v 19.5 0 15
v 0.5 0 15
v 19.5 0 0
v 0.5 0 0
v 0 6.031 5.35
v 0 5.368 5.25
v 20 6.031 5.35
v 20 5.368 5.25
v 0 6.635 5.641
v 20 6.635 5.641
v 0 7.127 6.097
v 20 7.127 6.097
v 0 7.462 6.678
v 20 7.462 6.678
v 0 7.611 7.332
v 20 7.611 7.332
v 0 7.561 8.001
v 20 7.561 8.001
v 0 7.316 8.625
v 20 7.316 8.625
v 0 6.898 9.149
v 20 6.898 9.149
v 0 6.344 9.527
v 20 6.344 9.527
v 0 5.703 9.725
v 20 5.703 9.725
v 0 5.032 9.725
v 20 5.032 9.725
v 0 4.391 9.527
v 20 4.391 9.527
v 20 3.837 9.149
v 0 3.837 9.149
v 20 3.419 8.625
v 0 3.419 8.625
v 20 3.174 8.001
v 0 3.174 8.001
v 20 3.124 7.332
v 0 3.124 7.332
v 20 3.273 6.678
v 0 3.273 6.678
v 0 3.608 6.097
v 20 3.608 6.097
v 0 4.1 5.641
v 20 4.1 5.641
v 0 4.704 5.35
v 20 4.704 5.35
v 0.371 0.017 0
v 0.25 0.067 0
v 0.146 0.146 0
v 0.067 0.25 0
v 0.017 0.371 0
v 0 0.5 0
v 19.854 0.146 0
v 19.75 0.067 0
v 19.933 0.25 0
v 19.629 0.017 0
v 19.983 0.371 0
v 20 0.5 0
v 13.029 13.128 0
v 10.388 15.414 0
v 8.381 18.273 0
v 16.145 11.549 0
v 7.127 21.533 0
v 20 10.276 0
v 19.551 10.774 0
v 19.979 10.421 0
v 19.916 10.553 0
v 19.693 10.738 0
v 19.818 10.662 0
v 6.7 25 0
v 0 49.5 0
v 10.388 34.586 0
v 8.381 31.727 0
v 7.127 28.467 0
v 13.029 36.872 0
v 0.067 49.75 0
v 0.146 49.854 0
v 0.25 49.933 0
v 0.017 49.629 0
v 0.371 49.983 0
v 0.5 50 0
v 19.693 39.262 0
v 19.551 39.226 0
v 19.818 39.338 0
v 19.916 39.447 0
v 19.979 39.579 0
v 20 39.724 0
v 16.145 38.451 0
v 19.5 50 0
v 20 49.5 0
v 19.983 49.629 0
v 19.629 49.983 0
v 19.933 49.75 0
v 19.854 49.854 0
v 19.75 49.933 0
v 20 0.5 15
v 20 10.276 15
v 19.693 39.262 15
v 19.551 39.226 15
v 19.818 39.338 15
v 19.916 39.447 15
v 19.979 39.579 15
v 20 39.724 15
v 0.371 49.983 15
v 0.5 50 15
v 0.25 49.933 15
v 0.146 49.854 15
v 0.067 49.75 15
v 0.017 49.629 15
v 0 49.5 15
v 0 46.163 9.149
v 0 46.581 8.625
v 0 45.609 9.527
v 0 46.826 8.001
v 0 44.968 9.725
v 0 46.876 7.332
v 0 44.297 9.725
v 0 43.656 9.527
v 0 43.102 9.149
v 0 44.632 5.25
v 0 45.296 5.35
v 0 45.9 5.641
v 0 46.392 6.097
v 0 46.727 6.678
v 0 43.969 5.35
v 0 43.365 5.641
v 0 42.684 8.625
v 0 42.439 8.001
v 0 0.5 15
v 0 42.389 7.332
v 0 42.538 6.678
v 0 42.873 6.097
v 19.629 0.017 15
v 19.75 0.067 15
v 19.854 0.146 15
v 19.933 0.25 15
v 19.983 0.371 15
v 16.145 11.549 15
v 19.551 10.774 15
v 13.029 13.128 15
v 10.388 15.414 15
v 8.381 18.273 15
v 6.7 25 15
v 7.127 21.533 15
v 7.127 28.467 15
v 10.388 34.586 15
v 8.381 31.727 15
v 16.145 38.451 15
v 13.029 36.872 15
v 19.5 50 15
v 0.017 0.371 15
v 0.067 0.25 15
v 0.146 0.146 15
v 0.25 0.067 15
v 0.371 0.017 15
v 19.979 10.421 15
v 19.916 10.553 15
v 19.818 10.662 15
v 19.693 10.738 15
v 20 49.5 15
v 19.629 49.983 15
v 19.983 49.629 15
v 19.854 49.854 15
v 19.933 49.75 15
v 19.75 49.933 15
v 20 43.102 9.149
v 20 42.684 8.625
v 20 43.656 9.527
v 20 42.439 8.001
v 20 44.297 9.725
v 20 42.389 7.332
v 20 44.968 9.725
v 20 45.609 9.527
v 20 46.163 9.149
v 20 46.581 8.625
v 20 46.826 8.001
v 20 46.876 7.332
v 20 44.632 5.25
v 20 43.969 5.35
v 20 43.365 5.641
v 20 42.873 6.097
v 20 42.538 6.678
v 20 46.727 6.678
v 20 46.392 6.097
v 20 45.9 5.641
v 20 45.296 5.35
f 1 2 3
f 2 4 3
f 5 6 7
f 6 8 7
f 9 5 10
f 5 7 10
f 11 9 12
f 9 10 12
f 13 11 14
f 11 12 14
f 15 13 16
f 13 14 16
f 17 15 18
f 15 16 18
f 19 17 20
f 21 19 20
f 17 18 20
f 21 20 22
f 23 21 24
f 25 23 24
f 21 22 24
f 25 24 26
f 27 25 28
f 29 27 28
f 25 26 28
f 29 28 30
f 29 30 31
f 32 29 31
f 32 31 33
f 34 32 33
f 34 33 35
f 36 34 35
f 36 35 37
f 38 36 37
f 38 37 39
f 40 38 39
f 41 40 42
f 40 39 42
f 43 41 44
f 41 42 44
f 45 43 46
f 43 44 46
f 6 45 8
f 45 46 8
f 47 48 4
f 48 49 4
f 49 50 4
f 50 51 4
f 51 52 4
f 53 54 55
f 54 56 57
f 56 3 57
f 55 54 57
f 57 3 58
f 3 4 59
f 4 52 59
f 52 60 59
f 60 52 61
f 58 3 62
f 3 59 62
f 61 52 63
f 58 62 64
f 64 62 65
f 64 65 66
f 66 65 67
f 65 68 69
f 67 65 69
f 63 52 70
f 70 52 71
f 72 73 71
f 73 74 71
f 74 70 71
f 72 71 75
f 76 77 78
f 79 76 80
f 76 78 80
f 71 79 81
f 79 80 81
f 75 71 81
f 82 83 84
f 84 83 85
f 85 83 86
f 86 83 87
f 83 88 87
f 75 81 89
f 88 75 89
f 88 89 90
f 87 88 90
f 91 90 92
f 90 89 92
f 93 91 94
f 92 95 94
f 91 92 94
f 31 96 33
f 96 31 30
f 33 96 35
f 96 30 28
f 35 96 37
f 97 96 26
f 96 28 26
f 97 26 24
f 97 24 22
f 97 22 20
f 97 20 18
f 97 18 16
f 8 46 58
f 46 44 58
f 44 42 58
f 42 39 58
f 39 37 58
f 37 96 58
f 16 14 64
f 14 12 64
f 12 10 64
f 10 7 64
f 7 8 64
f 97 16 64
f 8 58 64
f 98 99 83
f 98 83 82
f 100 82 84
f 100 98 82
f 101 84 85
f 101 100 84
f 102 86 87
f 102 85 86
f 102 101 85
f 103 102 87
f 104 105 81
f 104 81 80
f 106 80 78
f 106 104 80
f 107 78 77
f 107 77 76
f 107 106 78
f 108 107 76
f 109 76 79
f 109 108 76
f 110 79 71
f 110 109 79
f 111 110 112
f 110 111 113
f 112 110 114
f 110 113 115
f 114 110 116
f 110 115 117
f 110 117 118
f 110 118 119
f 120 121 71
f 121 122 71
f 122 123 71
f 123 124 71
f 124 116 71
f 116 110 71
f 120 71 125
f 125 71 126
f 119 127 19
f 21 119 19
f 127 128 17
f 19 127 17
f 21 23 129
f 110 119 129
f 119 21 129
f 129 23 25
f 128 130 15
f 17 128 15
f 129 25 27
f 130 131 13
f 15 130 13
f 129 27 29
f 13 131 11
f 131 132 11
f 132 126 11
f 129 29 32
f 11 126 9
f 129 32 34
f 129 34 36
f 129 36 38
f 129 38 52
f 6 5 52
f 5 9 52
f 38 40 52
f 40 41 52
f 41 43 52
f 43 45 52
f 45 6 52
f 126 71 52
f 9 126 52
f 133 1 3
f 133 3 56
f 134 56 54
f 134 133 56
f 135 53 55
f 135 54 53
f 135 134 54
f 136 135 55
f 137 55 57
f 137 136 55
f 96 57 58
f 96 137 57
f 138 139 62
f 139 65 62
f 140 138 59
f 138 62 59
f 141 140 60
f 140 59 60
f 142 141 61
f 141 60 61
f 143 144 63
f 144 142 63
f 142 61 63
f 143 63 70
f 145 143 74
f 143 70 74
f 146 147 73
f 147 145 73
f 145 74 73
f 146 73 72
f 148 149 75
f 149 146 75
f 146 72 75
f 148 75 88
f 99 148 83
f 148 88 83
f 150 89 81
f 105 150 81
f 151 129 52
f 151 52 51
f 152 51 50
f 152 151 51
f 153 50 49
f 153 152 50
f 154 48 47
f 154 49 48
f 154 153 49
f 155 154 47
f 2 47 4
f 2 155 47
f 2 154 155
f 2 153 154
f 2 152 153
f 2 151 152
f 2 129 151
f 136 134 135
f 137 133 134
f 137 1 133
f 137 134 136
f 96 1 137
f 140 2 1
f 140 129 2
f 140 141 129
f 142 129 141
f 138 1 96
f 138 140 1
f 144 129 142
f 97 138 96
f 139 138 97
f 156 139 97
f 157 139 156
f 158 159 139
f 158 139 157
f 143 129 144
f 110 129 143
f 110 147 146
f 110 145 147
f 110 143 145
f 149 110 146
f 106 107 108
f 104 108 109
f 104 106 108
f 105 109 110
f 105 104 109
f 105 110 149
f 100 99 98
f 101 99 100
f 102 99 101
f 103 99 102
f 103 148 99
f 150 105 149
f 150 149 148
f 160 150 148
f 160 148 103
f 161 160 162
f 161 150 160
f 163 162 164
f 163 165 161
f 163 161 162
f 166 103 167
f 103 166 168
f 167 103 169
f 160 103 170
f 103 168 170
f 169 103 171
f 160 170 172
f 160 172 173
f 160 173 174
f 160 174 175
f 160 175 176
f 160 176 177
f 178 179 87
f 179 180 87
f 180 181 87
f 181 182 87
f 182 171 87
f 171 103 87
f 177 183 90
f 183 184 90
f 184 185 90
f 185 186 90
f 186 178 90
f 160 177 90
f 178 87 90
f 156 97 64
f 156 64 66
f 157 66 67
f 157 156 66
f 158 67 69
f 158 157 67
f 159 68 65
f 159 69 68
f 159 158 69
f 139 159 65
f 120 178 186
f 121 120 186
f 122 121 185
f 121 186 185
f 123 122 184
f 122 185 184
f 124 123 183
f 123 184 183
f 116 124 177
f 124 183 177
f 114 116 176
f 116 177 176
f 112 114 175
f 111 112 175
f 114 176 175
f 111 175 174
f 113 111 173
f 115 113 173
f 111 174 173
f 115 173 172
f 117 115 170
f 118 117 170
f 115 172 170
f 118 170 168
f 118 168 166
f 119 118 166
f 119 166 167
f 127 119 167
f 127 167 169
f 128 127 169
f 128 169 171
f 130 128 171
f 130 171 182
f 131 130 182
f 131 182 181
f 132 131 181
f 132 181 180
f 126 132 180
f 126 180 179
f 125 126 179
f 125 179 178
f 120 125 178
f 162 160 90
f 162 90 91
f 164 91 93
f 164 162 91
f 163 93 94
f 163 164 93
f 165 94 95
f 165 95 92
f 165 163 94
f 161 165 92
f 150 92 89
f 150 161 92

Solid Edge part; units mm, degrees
sketch "Sketch1" plane through (0, 0, 0) normal (0, 0, 1) x (1, 0, 0)
  line L0 (0, 0) -> (20, 0)
  line L1 (20, 0) -> (20, 50)
  circle A0 centre (21, 25) radius 14.3
  line L2 (20, 50) -> (0, 50)
  line L3 (0, 50) -> (0, 0)
extrude "Protrusion1" add sketch "Sketch1" along normal blind 15
hole "Bohrung_1" at (20, 5.3675, 7.5) direction (-1, 0, 0) diameter 4.5 end through all
hole "Hole1" at (20, 44.6325, 7.5) direction (-1, 0, 0) diameter 4.5 end through all
fillet "Verrundung_2" radius 0.5 6 edges at (0, 50, 7.5) (0, 0, 7.5) (20, 0, 7.5) (20, 10.735, 7.5) (20, 39.265, 7.5) (20, 50, 7.5)
